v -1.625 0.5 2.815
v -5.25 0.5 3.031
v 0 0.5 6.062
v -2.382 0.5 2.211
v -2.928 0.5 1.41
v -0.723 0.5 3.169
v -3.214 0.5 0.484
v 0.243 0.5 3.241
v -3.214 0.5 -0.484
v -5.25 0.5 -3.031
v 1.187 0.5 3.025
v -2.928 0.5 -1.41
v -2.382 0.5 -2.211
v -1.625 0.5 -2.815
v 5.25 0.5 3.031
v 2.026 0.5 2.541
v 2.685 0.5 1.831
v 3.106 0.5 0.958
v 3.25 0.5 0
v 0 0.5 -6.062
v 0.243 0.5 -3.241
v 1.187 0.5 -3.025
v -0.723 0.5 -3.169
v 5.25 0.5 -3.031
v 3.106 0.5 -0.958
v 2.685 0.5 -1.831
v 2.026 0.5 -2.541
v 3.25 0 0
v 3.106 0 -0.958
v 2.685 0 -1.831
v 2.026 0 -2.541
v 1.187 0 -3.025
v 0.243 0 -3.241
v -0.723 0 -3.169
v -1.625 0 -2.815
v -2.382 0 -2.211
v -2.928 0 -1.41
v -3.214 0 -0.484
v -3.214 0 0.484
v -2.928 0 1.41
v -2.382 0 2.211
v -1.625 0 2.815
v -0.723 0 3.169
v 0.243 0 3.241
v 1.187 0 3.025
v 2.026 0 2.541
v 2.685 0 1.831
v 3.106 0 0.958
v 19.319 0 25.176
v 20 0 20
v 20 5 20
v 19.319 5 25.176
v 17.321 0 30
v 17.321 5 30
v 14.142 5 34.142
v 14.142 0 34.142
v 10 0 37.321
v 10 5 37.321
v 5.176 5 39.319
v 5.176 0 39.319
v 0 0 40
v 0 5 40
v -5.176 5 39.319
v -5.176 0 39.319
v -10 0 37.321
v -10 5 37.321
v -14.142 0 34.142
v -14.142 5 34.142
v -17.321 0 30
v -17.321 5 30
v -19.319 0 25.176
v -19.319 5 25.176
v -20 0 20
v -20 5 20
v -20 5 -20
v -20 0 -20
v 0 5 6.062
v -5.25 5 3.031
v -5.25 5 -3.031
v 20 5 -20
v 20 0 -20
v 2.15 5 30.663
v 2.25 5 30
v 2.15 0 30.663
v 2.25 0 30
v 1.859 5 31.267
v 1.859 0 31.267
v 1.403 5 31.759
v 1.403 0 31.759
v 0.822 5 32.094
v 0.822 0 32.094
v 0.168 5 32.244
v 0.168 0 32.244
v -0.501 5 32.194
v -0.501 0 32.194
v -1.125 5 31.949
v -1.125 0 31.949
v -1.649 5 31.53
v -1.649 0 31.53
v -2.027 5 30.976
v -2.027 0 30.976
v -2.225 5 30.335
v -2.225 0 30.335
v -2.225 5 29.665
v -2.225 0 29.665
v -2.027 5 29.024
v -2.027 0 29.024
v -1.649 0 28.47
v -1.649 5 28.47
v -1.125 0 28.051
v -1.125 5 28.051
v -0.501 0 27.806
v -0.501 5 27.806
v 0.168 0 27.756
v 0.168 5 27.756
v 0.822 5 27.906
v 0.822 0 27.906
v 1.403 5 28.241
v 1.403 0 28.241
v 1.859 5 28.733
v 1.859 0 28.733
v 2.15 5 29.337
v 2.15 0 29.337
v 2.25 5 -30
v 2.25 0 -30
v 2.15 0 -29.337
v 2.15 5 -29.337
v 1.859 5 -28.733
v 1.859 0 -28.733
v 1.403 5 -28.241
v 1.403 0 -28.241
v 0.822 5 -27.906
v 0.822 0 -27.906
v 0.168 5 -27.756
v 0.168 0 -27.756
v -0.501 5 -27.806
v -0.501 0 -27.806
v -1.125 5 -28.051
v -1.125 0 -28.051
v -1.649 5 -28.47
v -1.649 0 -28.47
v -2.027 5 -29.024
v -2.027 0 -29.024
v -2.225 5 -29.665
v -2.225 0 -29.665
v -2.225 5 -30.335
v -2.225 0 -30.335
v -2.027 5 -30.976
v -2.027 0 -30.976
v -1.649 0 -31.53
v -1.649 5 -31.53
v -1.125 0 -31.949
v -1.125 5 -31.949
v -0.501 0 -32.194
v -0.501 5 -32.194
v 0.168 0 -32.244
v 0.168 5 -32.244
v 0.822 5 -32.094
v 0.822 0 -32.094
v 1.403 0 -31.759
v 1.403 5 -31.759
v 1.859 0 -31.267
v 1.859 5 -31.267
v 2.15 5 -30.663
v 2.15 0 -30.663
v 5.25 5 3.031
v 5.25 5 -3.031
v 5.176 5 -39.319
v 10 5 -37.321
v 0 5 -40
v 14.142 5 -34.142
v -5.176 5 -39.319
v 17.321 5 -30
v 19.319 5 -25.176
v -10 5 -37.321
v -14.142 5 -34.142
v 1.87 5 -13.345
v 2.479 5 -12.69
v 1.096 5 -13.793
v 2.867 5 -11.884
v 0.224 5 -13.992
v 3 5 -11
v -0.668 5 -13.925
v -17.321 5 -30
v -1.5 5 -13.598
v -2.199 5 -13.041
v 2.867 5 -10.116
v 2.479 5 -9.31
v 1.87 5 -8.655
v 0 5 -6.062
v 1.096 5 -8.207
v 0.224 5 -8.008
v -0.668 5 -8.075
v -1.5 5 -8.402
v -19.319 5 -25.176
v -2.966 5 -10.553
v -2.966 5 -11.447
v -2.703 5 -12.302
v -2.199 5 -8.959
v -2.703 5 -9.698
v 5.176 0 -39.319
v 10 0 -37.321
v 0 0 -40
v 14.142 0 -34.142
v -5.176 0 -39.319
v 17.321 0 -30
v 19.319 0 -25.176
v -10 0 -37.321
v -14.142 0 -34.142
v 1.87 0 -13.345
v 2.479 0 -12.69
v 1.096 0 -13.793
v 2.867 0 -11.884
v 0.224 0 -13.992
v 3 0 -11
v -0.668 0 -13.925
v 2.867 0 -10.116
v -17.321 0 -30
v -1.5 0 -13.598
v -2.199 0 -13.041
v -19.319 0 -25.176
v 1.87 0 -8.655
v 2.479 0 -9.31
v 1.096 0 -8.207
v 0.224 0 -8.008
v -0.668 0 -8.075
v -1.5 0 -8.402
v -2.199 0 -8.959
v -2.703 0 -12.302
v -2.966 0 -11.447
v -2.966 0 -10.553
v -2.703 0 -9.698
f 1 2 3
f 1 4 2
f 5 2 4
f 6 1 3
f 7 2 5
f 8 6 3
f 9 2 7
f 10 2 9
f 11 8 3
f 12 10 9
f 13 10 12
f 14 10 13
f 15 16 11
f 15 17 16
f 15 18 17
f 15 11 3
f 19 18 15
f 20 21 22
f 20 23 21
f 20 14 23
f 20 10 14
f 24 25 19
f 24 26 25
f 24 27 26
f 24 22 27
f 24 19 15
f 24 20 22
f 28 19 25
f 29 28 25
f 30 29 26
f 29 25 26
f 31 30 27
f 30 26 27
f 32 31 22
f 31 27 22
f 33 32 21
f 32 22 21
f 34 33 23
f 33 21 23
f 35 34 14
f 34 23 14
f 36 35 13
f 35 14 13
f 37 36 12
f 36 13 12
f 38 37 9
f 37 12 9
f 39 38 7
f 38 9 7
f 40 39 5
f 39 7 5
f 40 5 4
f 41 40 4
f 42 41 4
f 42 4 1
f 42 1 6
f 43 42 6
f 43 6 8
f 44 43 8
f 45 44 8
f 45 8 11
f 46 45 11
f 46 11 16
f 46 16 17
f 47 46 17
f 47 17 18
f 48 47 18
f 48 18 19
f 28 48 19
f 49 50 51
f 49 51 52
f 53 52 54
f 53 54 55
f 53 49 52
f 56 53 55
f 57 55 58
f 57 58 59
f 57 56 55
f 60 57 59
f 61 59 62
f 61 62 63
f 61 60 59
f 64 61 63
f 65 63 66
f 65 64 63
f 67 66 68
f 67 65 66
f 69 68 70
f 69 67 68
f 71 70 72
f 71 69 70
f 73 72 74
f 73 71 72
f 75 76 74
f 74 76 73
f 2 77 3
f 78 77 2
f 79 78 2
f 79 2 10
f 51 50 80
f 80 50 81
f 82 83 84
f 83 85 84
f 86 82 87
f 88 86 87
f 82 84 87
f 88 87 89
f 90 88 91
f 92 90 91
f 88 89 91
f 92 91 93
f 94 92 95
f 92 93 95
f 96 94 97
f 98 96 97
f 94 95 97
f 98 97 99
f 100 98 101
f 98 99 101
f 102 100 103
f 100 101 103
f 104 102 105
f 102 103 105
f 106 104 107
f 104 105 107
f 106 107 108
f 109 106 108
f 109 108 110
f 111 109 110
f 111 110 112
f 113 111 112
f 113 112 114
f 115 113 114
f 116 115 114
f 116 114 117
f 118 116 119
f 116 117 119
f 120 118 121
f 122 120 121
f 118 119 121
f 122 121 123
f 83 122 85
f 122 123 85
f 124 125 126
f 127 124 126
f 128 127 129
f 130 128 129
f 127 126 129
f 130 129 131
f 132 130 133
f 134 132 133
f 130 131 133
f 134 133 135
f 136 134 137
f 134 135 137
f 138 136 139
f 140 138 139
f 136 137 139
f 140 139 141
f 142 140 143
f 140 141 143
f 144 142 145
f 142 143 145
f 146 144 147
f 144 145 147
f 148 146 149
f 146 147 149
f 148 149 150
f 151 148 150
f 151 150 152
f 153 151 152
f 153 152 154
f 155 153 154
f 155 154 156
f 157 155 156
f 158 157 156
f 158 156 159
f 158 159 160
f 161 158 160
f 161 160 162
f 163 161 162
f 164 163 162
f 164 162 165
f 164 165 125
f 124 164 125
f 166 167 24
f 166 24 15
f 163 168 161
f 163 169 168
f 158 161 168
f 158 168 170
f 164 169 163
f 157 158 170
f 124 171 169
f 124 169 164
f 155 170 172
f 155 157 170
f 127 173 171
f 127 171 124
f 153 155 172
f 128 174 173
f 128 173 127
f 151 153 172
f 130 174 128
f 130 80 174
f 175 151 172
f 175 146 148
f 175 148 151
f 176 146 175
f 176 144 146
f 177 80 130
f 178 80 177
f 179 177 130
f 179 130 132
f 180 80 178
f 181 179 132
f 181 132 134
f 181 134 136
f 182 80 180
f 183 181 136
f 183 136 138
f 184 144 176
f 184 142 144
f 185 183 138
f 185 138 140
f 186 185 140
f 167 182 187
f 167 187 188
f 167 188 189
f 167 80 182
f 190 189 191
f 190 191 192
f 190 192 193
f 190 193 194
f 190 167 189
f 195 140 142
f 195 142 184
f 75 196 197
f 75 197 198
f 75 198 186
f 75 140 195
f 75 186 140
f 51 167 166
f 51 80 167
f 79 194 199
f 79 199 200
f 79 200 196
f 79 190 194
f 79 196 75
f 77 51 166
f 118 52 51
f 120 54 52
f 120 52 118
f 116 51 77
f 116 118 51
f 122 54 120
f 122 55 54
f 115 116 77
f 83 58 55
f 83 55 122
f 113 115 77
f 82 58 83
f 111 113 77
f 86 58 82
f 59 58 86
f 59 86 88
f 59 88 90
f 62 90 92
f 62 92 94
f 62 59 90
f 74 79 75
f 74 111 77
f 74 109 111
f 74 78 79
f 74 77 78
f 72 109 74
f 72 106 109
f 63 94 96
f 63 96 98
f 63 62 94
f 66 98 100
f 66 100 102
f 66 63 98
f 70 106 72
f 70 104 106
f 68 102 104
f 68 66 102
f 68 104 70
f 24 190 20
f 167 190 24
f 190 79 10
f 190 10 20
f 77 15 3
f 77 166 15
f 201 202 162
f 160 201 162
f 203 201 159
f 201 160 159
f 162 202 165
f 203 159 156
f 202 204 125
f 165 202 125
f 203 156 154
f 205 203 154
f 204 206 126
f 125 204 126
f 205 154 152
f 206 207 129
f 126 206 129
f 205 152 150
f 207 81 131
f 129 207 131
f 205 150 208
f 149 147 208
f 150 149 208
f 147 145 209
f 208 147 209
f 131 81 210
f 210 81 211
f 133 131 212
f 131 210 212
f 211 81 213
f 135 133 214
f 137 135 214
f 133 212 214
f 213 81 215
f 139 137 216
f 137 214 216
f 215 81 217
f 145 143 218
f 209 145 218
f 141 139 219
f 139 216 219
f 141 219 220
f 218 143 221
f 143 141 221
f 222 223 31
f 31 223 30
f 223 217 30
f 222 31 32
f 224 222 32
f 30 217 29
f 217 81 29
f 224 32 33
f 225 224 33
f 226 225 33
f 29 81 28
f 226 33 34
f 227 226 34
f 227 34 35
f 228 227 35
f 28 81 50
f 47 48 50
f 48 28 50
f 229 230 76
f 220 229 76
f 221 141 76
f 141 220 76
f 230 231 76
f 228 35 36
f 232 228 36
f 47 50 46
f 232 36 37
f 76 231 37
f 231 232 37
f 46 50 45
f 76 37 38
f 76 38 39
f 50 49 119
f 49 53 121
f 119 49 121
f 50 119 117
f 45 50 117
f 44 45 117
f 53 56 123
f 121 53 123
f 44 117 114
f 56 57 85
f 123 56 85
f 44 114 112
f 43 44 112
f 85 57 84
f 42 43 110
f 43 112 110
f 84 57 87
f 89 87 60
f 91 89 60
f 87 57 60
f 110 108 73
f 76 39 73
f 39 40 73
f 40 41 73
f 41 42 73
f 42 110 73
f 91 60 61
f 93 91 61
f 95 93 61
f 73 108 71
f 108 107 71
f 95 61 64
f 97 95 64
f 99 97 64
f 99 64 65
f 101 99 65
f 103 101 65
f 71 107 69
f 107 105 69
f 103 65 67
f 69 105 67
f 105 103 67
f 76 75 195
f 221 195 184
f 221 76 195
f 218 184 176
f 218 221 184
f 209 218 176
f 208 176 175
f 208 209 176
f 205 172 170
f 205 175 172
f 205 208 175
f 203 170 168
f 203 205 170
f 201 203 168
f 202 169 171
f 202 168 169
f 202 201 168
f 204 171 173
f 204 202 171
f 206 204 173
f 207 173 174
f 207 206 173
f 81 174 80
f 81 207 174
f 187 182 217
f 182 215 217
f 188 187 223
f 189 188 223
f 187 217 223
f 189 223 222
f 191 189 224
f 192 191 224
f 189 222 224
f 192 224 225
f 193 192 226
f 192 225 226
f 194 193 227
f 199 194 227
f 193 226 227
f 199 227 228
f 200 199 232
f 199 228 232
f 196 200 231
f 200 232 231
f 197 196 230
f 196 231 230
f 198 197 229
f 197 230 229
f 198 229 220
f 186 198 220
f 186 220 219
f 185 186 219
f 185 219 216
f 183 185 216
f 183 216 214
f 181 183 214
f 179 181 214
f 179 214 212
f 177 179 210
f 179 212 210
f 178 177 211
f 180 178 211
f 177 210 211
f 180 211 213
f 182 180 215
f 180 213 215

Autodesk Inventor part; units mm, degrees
ref_plane "YZ Plane" through (0, 0, 0) normal (1, 0, 0) x (0, 1, 0)
ref_plane "XZ Plane" through (0, 0, 0) normal (0, 1, 0) x (-1, 0, 0)
ref_plane "XY Plane" through (0, 0, 0) normal (0, 0, 1) x (1, 0, 0)
sketch "Sketch1" plane through (0, 0, 0) normal (0, 1, 0) x (-1, 0, 0)
  line L0 (0, 40) -> (0, 40)
  line L1 (-20, 20) -> (-20, -20)
  line L2 (0, -40) -> (0, -40)
  line L3 (20, -20) -> (20, 20)
  line L4 (20, 40) -> (-20, -40) construction
  line L5 (-20, 40) -> (20, -40) construction
  arc A0 (0, -40) -> (20, -20) centre (0, -20) ccw
  arc A1 (20, 20) -> (0, 40) centre (0, 20) ccw
  arc A2 (0, 40) -> (-20, 20) centre (0, 20) ccw
  arc A3 (-20, -20) -> (0, -40) centre (0, -20) ccw
  point P0 (0, 0)
  dimension "d0" = 40
  dimension "d1" = 80
  dimension "d18" = 20
extrude "Extrusion1" add sketch "Sketch1" along normal blind 5
sketch "Sketch2" plane through (0, 5, 0) normal (0, 1, 0) x (1, 0, 0)
  line L0 (-5.25, 3.0311) -> (0, 6.0622)
  line L1 (0, 6.0622) -> (5.25, 3.0311)
  line L2 (5.25, 3.0311) -> (5.25, -3.0311)
  line L3 (5.25, -3.0311) -> (0, -6.0622)
  line L4 (0, -6.0622) -> (-5.25, -3.0311)
  line L5 (-5.25, -3.0311) -> (-5.25, 3.0311)
  point P0 (0, 0)
  point P1 (0, 0)
  point P2 (5.25, 0)
  point P3 (-5.25, 0)
  dimension "d4" = 10.5
extrude "Extrusion2" cut sketch "Sketch2" against normal blind 4.5
sketch "Sketch3" plane through (0, 0.5, 0) normal (0, 1, 0) x (1, 0, 0)
  circle A0 centre (0, 0) radius 3.25
  dimension "d7" = 6.5
extrude "Extrusion3" cut sketch "Sketch3" against normal through all
sketch "Sketch4" plane through (0, 0, 0) normal (0, -1, 0) x (1, 0, 0)
  circle A0 centre (0, -11) radius 3
  circle A1 centre (0, 30) radius 2.25
  circle A2 centre (0, -30) radius 2.25
  point P0 (0, 0)
  dimension "d10" = 6
  dimension "d11" = 11
  dimension "d12" = 4.5
  dimension "d13" = 4.5
  dimension "d14" = 30
  dimension "d15" = 30
extrude "Extrusion4" cut sketch "Sketch4" against normal through all
properties part number "Tripod mount"
